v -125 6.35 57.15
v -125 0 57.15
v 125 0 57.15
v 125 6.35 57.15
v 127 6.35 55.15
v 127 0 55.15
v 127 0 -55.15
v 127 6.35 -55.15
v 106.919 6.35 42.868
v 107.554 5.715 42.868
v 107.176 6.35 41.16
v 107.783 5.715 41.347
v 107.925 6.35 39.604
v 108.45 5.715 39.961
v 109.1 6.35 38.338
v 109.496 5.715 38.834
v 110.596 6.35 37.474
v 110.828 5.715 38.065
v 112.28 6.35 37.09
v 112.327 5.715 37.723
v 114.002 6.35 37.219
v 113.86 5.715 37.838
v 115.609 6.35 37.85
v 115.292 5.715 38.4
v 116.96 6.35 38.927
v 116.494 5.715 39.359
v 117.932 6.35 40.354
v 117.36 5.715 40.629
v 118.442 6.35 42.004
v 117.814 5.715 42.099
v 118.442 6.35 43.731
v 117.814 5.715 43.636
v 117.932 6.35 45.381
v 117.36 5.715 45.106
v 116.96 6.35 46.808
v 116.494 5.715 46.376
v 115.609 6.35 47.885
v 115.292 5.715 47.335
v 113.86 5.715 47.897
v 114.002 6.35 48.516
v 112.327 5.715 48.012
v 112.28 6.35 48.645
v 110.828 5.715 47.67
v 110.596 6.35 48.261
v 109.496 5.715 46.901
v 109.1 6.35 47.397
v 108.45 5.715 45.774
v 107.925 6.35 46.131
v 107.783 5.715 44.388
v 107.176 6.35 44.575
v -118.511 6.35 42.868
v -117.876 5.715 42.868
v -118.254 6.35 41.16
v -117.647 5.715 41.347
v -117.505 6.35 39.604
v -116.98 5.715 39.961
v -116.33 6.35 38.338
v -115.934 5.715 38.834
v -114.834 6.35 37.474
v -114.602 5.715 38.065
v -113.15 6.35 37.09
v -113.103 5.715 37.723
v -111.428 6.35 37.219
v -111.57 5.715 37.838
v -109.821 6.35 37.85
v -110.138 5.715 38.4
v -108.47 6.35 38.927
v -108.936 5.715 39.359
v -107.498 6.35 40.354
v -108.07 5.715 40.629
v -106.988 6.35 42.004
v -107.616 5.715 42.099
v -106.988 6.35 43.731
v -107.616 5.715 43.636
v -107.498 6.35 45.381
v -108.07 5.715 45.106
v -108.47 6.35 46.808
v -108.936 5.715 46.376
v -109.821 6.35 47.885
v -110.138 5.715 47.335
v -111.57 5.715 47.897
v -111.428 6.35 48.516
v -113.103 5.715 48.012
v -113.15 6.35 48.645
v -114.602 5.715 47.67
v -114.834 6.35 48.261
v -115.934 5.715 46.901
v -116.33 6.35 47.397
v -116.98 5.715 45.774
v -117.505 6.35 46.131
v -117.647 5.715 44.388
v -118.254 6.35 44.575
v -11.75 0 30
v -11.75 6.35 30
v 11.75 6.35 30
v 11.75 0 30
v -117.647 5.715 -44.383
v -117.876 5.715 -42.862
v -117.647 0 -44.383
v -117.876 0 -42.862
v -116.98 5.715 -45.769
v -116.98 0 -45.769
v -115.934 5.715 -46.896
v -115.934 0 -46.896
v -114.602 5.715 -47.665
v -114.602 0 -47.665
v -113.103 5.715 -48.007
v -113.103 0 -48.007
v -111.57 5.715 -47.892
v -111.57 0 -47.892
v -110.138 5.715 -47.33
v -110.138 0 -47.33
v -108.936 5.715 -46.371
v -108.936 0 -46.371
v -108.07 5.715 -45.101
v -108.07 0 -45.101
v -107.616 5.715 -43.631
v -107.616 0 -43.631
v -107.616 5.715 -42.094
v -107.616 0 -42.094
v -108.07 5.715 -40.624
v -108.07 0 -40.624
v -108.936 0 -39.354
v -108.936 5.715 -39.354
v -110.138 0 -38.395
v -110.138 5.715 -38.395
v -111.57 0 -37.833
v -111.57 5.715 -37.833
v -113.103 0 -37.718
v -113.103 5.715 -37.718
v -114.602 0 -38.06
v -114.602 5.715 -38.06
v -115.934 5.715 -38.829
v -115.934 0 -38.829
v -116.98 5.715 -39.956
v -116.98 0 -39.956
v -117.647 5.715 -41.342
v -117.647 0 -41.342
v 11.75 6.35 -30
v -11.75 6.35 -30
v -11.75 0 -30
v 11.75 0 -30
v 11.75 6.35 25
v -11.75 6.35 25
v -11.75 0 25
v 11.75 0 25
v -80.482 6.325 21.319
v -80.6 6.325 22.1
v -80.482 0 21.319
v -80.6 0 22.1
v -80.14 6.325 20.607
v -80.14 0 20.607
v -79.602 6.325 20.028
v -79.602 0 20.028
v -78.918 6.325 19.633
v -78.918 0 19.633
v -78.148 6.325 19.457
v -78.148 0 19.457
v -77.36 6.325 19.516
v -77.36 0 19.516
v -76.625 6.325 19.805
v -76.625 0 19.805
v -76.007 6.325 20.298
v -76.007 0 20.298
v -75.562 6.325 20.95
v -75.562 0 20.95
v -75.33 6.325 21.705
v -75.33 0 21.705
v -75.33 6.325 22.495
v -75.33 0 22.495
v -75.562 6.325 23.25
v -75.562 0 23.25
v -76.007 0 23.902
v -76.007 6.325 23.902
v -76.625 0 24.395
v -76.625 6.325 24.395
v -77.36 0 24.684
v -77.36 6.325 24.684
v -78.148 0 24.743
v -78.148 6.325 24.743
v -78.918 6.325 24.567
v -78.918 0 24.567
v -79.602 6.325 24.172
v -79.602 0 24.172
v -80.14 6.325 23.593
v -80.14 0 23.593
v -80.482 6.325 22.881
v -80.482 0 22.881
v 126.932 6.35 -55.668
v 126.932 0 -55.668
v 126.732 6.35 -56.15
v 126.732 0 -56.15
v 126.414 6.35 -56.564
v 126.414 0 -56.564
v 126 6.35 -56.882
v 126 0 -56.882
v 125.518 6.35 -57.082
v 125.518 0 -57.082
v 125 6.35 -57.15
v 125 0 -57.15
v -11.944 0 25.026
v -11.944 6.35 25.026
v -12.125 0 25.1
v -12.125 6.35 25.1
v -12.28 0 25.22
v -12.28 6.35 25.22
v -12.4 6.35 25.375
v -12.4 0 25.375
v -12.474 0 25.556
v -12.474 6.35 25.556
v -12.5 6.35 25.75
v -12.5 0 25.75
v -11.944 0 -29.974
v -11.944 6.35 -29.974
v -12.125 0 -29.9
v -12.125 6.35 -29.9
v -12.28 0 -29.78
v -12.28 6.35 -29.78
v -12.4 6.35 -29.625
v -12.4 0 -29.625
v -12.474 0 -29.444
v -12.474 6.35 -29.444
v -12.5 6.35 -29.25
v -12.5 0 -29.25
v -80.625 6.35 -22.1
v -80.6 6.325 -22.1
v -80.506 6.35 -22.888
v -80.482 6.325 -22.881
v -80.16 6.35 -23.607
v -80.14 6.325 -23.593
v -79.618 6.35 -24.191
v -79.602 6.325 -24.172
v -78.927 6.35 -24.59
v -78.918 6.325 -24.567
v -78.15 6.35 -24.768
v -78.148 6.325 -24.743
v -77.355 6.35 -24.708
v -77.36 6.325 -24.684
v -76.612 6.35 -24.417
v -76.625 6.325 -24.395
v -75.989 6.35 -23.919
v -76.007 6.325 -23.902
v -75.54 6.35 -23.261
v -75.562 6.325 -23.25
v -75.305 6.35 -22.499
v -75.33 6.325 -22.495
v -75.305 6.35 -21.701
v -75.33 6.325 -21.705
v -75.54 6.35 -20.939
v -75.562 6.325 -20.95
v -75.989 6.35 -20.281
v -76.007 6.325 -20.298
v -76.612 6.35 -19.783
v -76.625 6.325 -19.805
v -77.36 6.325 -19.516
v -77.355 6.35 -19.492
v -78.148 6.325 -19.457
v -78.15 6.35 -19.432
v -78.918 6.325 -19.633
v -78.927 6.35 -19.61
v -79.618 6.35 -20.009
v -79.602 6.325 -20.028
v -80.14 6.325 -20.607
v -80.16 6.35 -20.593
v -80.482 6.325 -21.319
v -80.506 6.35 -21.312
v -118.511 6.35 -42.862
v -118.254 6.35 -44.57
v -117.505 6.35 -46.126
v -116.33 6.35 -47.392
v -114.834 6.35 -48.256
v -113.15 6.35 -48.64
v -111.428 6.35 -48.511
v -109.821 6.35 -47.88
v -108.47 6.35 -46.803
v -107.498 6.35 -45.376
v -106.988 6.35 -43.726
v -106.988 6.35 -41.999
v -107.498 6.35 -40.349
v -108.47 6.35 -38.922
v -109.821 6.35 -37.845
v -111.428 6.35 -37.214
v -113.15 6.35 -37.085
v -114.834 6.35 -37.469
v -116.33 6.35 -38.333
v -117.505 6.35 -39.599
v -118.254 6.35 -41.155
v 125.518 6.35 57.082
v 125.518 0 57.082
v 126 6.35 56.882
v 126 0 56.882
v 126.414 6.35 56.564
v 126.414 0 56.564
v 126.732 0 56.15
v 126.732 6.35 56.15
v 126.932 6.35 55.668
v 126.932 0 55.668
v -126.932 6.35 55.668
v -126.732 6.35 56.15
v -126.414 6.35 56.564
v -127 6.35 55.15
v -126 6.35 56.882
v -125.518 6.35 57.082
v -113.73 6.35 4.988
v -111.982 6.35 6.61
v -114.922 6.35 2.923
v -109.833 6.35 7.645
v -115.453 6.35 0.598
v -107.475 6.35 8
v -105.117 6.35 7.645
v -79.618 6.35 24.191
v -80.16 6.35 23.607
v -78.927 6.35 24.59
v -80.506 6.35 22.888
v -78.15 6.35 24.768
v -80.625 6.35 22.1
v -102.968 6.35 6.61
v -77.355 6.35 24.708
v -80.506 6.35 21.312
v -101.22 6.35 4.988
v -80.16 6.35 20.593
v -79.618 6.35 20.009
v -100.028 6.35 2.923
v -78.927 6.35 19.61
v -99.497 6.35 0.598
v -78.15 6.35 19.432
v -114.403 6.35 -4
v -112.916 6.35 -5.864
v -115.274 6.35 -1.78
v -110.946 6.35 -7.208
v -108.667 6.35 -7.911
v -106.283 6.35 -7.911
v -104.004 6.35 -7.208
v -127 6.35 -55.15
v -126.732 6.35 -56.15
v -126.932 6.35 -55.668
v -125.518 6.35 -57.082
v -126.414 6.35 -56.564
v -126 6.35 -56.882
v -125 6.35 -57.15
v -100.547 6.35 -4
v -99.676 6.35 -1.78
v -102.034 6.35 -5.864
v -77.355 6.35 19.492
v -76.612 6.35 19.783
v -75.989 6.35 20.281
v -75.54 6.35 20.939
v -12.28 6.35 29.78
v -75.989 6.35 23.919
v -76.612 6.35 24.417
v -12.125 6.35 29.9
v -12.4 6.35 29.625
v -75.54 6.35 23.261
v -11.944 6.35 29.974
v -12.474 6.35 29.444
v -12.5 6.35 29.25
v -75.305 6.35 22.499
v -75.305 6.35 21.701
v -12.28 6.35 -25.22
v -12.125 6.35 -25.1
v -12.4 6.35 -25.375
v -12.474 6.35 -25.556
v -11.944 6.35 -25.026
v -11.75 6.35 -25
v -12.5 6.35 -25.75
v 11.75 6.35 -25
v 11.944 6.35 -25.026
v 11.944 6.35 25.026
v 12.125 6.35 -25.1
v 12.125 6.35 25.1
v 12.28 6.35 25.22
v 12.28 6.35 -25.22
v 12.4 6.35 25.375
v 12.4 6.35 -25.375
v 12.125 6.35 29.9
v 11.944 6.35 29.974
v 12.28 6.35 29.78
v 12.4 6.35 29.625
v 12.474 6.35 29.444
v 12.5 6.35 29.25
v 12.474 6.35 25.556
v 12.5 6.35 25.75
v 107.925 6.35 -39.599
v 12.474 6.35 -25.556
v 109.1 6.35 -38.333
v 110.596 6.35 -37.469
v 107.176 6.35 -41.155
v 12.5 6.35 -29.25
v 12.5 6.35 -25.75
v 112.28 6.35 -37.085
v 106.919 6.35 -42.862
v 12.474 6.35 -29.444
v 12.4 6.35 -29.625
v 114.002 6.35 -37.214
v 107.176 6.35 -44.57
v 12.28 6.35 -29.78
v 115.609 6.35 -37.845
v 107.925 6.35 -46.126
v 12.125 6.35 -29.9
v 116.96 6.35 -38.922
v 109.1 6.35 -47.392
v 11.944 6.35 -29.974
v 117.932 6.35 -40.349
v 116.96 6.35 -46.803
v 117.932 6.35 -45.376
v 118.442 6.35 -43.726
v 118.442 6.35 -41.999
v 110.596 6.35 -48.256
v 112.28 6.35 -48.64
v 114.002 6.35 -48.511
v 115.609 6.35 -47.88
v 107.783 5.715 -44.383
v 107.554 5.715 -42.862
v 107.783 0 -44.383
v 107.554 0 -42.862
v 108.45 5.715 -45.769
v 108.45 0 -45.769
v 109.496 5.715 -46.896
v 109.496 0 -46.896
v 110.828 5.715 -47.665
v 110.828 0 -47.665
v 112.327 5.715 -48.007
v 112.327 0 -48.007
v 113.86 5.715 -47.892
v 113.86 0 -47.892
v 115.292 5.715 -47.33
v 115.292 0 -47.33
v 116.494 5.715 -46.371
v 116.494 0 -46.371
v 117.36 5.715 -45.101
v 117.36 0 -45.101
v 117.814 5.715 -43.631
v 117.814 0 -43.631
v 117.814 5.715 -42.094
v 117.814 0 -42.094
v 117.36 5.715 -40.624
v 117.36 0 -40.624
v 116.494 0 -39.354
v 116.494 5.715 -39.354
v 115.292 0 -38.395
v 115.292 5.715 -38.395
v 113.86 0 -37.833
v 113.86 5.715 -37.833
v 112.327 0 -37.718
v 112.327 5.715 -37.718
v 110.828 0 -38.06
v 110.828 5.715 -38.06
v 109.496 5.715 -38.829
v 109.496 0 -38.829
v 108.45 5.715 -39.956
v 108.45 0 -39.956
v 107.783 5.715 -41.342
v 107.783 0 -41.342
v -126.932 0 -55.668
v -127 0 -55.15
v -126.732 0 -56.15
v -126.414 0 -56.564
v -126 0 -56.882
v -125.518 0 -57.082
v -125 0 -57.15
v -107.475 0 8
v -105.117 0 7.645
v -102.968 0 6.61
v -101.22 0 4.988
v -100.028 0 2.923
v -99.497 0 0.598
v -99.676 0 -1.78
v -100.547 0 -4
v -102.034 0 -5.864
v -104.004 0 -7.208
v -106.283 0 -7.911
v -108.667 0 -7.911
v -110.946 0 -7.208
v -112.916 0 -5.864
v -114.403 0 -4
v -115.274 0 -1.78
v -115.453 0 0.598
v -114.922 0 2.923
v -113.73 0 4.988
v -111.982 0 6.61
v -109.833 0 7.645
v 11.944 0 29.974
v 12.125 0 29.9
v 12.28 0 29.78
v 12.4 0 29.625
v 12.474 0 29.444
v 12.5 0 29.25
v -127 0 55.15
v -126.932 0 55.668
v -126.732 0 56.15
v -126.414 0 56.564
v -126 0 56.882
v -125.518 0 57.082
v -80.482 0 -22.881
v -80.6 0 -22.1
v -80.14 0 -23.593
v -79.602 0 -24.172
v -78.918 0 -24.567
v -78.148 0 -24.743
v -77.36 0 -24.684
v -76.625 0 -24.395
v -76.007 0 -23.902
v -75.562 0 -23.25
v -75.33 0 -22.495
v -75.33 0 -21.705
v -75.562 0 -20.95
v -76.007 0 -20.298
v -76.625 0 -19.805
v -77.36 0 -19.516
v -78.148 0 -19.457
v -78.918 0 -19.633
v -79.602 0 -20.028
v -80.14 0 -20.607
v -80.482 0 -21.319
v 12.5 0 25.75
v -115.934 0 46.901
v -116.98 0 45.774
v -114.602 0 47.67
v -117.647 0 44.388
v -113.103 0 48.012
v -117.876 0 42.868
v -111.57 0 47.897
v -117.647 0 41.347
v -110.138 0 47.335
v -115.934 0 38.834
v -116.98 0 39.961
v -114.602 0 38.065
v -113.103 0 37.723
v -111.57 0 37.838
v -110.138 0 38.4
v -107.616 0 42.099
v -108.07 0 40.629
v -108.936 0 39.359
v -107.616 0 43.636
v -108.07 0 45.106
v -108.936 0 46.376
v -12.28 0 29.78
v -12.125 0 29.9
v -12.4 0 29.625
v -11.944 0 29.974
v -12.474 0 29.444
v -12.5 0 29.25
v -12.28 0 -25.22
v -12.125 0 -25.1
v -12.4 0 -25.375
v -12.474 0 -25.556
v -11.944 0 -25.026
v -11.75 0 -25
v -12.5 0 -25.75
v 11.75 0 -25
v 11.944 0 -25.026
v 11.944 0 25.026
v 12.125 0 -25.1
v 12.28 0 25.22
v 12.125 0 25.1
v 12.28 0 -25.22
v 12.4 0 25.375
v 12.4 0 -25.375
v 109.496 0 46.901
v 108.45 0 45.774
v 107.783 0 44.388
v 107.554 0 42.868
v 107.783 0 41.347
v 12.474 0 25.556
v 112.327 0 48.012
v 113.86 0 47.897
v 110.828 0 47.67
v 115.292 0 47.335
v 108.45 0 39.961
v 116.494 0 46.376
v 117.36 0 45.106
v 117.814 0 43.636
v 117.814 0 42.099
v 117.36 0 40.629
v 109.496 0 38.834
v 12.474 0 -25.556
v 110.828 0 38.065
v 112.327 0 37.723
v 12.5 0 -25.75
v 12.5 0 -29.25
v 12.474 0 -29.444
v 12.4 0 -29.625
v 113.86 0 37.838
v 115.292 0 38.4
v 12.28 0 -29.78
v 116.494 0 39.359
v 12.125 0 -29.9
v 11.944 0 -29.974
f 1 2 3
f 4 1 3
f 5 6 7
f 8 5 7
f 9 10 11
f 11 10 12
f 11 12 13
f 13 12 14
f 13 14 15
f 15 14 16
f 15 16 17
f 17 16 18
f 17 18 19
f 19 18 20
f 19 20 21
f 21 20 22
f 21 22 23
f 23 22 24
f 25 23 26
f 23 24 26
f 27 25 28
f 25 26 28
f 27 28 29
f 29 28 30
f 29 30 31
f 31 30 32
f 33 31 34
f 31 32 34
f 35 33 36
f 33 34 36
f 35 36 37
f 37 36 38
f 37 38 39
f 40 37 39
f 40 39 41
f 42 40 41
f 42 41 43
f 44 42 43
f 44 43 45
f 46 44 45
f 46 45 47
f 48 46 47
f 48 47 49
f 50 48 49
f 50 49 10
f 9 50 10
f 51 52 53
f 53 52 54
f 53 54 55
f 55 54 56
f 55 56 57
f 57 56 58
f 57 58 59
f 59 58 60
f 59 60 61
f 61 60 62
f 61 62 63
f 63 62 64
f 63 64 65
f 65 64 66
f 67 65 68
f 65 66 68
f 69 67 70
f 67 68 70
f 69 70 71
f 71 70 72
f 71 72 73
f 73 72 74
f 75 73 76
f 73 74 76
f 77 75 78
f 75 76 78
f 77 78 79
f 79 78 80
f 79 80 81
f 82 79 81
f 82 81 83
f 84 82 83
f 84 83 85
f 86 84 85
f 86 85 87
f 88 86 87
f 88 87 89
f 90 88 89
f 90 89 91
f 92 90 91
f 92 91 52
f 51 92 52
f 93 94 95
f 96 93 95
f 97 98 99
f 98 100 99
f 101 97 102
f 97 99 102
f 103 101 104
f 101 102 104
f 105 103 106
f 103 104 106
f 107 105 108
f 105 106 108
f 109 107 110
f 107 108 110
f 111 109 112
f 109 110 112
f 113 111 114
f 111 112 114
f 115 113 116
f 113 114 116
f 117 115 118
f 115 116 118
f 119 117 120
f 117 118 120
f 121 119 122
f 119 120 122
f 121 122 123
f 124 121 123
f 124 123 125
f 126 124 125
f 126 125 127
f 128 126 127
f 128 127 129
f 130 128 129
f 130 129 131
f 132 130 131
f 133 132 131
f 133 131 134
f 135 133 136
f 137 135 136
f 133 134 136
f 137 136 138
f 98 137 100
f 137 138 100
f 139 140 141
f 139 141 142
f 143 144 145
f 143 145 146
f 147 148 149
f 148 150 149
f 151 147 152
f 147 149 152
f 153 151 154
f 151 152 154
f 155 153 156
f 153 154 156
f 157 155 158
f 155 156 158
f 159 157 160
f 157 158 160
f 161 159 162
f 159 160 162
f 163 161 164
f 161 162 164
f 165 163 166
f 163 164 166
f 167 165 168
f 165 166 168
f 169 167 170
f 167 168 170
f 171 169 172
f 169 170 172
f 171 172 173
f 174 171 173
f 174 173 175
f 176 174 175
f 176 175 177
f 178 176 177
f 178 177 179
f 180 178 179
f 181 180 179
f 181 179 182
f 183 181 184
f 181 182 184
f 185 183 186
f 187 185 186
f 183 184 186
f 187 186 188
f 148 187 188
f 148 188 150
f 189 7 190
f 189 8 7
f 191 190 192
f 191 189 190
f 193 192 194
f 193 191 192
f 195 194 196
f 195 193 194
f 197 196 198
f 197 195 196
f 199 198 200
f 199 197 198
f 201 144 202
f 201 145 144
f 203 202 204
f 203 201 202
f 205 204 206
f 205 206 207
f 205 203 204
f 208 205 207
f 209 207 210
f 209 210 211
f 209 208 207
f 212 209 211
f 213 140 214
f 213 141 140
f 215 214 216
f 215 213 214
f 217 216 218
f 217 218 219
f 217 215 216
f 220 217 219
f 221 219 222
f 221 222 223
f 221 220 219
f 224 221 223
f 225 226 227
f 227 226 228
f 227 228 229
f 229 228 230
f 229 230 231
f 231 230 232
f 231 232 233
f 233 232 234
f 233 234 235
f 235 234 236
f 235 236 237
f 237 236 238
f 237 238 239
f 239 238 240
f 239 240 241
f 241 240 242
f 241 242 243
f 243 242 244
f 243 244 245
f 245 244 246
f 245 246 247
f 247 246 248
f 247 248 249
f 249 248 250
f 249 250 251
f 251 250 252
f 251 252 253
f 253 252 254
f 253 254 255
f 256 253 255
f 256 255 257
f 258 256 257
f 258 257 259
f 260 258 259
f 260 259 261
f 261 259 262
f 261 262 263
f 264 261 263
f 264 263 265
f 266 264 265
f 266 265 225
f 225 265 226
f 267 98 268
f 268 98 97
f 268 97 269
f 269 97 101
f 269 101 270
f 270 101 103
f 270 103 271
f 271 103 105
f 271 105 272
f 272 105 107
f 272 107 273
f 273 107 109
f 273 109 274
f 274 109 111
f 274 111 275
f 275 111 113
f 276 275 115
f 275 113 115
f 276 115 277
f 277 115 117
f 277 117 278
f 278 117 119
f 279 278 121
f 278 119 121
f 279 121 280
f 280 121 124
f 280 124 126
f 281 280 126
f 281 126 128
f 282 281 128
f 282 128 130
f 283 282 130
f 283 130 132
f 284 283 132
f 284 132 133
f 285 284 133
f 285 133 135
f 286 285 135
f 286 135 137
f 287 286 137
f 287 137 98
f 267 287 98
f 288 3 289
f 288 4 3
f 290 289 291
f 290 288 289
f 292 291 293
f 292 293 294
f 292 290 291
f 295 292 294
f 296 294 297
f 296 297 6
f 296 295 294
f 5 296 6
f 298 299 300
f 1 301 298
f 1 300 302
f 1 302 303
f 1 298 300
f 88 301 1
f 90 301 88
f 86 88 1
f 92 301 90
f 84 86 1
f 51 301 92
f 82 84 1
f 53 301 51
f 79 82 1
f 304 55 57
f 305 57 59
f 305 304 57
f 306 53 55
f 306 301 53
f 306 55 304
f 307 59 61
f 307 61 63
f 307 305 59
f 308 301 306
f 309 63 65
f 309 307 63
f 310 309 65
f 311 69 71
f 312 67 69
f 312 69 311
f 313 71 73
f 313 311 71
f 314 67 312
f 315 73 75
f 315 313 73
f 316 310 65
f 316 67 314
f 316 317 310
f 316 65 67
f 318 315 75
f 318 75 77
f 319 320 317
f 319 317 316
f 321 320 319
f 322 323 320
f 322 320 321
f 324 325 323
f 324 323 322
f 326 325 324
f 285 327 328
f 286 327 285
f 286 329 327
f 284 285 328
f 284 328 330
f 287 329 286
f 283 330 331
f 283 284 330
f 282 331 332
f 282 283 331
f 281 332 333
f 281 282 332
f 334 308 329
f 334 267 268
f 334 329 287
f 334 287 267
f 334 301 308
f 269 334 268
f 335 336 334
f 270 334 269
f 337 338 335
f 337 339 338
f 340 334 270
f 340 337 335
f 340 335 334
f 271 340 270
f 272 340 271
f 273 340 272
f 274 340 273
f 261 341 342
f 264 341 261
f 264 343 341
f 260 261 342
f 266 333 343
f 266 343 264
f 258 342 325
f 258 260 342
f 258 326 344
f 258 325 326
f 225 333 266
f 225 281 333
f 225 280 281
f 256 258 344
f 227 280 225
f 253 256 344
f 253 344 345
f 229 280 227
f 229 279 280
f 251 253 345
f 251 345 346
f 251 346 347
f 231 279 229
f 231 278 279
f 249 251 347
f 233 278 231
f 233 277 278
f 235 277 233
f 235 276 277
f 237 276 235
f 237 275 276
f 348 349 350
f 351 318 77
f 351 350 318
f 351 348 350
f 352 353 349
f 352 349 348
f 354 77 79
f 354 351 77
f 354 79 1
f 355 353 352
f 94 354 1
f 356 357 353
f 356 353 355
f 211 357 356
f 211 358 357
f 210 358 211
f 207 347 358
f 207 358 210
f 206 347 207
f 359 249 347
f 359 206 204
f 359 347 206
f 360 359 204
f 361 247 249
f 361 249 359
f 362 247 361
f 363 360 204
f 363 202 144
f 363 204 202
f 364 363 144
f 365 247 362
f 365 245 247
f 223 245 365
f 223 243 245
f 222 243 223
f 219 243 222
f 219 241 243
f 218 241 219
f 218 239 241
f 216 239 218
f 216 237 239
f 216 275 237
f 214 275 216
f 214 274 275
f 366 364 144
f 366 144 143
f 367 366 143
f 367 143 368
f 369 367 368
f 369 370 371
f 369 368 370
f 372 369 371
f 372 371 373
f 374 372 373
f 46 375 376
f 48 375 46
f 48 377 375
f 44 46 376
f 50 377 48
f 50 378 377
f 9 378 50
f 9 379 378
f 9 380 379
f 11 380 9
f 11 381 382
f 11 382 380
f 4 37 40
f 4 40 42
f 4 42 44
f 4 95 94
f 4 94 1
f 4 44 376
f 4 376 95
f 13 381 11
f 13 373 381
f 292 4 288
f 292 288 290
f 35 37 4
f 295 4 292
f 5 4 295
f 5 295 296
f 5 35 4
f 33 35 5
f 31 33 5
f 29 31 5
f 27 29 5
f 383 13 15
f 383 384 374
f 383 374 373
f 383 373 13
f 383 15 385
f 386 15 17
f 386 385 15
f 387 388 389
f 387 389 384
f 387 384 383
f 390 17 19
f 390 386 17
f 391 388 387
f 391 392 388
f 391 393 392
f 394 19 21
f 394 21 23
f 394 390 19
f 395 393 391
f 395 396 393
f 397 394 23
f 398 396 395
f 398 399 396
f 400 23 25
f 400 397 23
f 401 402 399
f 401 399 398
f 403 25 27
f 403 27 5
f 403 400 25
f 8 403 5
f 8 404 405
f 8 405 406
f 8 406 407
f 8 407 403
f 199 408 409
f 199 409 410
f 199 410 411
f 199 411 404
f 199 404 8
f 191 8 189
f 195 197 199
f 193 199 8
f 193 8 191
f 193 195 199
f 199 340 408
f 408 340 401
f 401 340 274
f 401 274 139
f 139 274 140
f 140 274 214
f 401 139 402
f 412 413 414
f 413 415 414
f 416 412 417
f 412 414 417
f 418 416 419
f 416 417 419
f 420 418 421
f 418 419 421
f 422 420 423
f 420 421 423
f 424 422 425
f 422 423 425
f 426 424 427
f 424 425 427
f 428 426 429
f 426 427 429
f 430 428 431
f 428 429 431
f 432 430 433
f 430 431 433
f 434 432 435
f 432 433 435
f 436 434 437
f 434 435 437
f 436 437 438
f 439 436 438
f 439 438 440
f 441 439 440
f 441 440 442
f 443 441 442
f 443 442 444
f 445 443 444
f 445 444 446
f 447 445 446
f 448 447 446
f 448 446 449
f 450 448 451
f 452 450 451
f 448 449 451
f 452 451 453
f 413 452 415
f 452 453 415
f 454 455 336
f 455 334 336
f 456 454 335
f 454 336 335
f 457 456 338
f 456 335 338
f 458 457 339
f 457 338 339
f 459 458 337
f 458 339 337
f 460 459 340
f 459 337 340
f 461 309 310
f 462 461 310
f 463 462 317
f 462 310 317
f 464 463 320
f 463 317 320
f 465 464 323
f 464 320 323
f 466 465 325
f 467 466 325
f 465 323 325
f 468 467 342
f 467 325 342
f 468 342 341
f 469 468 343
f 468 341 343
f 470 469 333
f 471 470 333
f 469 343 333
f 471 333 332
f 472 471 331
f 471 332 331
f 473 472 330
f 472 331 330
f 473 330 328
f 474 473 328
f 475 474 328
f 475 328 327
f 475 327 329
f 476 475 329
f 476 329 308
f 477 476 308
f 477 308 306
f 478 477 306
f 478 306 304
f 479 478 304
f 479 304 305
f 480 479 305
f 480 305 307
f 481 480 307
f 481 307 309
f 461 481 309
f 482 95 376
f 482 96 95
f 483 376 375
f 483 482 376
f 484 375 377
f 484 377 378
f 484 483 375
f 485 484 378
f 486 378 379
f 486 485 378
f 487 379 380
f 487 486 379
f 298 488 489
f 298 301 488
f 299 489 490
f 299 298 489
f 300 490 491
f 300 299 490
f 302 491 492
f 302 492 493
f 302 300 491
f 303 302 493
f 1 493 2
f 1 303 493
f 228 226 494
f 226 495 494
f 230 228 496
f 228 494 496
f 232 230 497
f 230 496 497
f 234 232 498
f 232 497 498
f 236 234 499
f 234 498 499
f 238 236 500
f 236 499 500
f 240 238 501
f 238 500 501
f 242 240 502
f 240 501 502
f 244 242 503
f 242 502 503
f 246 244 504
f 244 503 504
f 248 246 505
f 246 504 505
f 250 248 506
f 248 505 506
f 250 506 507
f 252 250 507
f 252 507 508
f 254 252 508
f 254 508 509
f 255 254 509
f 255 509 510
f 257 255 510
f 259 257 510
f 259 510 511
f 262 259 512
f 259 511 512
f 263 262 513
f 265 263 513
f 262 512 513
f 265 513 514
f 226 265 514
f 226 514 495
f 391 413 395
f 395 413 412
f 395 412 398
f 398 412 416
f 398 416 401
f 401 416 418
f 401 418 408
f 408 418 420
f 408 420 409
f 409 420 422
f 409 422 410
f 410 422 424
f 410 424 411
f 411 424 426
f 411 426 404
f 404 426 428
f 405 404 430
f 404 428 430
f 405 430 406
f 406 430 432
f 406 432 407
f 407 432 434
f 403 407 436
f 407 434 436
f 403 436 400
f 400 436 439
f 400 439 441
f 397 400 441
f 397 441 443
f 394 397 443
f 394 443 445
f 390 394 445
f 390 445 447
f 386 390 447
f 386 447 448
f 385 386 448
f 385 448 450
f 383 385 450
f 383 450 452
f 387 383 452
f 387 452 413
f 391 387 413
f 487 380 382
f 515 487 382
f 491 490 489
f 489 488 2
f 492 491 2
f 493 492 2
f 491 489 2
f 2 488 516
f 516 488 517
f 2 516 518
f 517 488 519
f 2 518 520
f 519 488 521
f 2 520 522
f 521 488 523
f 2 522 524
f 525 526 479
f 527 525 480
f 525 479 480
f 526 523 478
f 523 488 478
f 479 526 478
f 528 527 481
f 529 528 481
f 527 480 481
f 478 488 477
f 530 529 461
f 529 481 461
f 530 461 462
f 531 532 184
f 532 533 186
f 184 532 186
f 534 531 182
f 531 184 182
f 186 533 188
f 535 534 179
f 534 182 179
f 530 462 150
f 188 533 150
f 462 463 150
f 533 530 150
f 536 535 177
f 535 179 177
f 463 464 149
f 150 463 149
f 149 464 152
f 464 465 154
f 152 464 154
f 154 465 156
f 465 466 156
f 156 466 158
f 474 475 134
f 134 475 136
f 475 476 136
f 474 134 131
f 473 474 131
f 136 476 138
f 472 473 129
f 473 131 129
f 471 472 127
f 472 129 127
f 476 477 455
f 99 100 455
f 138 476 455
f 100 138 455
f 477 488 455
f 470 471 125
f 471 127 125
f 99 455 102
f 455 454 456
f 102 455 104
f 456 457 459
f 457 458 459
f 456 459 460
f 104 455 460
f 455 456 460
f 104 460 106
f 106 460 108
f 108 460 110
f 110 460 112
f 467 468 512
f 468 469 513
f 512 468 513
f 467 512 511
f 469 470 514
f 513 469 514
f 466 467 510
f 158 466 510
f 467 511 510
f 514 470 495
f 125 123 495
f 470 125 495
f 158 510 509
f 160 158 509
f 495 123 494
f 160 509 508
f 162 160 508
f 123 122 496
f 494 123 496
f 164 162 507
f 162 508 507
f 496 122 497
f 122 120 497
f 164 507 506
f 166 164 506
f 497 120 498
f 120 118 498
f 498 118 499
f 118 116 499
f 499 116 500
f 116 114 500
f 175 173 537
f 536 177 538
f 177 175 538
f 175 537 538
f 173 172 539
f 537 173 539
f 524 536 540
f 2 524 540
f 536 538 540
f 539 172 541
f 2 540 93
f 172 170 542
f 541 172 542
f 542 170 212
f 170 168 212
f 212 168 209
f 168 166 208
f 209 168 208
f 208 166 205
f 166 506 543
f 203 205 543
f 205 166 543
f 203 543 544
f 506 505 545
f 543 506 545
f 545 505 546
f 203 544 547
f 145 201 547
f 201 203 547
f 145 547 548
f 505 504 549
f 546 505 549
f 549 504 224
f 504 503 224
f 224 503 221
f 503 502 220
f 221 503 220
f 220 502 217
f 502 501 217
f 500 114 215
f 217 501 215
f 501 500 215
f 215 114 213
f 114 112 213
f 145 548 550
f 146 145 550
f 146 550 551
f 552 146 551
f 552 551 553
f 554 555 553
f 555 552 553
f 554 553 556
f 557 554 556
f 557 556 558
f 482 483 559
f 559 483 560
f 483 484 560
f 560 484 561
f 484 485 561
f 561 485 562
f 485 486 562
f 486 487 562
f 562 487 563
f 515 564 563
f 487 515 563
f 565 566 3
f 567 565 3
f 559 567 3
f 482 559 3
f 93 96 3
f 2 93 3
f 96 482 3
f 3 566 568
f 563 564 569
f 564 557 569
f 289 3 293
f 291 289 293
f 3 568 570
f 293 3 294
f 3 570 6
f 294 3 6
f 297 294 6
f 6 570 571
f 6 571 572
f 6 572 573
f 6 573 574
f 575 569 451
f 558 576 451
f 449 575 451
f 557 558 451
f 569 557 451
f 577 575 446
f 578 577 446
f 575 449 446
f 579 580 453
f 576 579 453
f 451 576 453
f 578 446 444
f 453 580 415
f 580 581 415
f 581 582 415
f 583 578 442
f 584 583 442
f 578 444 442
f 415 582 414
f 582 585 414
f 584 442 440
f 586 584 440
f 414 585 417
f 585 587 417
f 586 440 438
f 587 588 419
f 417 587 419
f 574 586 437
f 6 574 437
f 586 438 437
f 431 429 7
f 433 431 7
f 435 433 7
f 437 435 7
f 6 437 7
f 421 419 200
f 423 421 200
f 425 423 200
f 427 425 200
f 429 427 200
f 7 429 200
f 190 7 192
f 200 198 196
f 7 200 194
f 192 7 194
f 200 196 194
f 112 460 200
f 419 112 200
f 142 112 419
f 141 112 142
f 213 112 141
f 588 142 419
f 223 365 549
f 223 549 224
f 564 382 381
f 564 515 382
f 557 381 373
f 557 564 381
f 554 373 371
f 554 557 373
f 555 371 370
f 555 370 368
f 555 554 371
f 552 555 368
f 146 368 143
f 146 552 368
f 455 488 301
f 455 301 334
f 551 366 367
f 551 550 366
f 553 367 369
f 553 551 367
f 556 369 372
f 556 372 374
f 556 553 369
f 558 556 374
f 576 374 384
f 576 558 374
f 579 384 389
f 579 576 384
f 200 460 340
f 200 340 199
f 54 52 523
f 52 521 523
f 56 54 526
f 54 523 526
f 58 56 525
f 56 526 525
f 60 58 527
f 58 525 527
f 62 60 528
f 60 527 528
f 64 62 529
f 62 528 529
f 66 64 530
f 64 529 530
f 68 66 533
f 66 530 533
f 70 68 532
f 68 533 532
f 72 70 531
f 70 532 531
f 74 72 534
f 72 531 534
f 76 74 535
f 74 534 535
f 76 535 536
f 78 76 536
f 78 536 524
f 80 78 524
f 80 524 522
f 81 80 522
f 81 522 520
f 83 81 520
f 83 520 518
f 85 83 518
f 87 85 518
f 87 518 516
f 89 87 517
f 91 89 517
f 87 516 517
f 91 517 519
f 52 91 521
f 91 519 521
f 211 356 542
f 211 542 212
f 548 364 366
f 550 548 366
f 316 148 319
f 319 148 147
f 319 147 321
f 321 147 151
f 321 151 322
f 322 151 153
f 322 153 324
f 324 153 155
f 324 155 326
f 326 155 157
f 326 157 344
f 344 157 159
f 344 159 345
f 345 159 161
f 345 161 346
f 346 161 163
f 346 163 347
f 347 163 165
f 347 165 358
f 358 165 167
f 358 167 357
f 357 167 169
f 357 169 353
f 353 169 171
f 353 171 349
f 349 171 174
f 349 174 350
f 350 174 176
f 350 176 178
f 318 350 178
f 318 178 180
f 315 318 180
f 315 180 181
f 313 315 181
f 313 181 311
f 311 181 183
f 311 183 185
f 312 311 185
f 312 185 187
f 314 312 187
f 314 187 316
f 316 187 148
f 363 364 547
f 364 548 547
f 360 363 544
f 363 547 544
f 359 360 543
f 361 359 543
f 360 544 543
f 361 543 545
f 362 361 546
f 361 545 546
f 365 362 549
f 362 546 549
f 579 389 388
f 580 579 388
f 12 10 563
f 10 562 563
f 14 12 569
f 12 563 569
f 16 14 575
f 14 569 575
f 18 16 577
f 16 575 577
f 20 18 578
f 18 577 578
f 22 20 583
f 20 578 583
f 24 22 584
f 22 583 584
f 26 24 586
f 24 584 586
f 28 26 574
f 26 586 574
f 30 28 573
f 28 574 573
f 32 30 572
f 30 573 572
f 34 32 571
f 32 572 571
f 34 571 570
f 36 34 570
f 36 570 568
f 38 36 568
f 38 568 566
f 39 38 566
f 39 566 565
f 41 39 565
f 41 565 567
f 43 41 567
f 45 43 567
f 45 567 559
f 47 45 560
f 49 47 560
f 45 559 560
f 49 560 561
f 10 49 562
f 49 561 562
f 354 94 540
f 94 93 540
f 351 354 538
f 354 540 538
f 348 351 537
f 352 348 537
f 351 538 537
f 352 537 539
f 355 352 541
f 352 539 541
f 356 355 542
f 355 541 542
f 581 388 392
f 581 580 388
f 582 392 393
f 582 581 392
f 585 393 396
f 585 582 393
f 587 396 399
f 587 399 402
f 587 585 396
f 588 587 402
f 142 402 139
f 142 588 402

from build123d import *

# Parameters (mm, degrees)
SKETCH1_W                         = 254
SKETCH1_H                         = 114.3
BOSS_EXTRUDE1_DEPTH               = 6.35
FILLET1_R                         = 2
SKETCH6_W                         = 25
SKETCH6_H                         = 5
CUT_EXTRUDE1_DEPTH                = 140.411064841
FILLET2_R                         = 0.75
F_3_8_CLEARANCE_HOLE1_D           = 10.31748
F_3_8_CLEARANCE_HOLE1_CSINK_D     = 11.58748
F_3_8_CLEARANCE_HOLE1_CSINK_ANGLE = 90
SKETCH10_R                        = 8
CUT_EXTRUDE2_DEPTH                = 140.411064841
M3_CLEARANCE_HOLE1_D              = 5.3
M3_CLEARANCE_HOLE1_CSINK_D        = 5.35
M3_CLEARANCE_HOLE1_CSINK_ANGLE    = 90


with BuildPart() as part:
    # Sketch1 → Boss-Extrude1 (new body)
    with BuildSketch(Plane(origin=(0, 0, 0), x_dir=(1, 0, 0), z_dir=(0, 1, 0))):
        Rectangle(SKETCH1_W, SKETCH1_H)
    extrude(amount=BOSS_EXTRUDE1_DEPTH)

    # Fillet1
    fillet1_edges = [part.edges().sort_by_distance(p)[0] for p in [
        (127, 3.175, 57.15),
        (-127, 3.175, 57.15),
        (-127, 3.175, -57.15),
        (127, 3.175, -57.15),
    ]]
    fillet(fillet1_edges, radius=FILLET1_R)

    # Sketch6 → Cut-Extrude1 (cut, through all)
    with BuildSketch(Plane(origin=(0, 6.35, 0), x_dir=(1, 0, 0), z_dir=(0, 1, 0))):
        with Locations((0, 27.5)):
            Rectangle(SKETCH6_W, SKETCH6_H)
        with Locations((0, -27.5)):
            Rectangle(SKETCH6_W, SKETCH6_H)
    extrude(amount=-CUT_EXTRUDE1_DEPTH, mode=Mode.SUBTRACT)

    # Fillet2
    fillet2_edges = [part.edges().sort_by_distance(p)[0] for p in [
        (12.5, 3.175, 25),
        (12.5, 3.175, 30),
        (-12.5, 3.175, 30),
        (-12.5, 3.175, 25),
        (12.5, 3.175, -25),
        (-12.5, 3.175, -25),
        (-12.5, 3.175, -30),
        (12.5, 3.175, -30),
    ]]
    fillet(fillet2_edges, radius=FILLET2_R)

    # 3/8 Clearance Hole1 (through all)
    with Locations(Plane(origin=(0, 6.35, 0), x_dir=(1, 0, 0), z_dir=(0, 1, 0))):
        with Locations((112.7125, 42.8625), (112.7125, -42.8675), (-112.7175, 42.8625), (-112.7175, -42.8675)):
            CounterSinkHole(F_3_8_CLEARANCE_HOLE1_D / 2, F_3_8_CLEARANCE_HOLE1_CSINK_D / 2, counter_sink_angle=F_3_8_CLEARANCE_HOLE1_CSINK_ANGLE)

    # Sketch10 → Cut-Extrude2 (cut, through all)
    with BuildSketch(Plane(origin=(0, 6.35, 0), x_dir=(1, 0, 0), z_dir=(0, 1, 0))):
        with Locations(Location((-107.475, 0, 0), (0, 0, 270))):
            Circle(SKETCH10_R)
    extrude(amount=-CUT_EXTRUDE2_DEPTH, mode=Mode.SUBTRACT)

    # M3 Clearance Hole1 (through all)
    with Locations(Plane(origin=(0, 6.35, 0), x_dir=(1, 0, 0), z_dir=(0, 1, 0))):
        with Locations((-77.95, 22.1), (-77.95, -22.1)):
            CounterSinkHole(M3_CLEARANCE_HOLE1_D / 2, M3_CLEARANCE_HOLE1_CSINK_D / 2, counter_sink_angle=M3_CLEARANCE_HOLE1_CSINK_ANGLE)


solid = part.part
